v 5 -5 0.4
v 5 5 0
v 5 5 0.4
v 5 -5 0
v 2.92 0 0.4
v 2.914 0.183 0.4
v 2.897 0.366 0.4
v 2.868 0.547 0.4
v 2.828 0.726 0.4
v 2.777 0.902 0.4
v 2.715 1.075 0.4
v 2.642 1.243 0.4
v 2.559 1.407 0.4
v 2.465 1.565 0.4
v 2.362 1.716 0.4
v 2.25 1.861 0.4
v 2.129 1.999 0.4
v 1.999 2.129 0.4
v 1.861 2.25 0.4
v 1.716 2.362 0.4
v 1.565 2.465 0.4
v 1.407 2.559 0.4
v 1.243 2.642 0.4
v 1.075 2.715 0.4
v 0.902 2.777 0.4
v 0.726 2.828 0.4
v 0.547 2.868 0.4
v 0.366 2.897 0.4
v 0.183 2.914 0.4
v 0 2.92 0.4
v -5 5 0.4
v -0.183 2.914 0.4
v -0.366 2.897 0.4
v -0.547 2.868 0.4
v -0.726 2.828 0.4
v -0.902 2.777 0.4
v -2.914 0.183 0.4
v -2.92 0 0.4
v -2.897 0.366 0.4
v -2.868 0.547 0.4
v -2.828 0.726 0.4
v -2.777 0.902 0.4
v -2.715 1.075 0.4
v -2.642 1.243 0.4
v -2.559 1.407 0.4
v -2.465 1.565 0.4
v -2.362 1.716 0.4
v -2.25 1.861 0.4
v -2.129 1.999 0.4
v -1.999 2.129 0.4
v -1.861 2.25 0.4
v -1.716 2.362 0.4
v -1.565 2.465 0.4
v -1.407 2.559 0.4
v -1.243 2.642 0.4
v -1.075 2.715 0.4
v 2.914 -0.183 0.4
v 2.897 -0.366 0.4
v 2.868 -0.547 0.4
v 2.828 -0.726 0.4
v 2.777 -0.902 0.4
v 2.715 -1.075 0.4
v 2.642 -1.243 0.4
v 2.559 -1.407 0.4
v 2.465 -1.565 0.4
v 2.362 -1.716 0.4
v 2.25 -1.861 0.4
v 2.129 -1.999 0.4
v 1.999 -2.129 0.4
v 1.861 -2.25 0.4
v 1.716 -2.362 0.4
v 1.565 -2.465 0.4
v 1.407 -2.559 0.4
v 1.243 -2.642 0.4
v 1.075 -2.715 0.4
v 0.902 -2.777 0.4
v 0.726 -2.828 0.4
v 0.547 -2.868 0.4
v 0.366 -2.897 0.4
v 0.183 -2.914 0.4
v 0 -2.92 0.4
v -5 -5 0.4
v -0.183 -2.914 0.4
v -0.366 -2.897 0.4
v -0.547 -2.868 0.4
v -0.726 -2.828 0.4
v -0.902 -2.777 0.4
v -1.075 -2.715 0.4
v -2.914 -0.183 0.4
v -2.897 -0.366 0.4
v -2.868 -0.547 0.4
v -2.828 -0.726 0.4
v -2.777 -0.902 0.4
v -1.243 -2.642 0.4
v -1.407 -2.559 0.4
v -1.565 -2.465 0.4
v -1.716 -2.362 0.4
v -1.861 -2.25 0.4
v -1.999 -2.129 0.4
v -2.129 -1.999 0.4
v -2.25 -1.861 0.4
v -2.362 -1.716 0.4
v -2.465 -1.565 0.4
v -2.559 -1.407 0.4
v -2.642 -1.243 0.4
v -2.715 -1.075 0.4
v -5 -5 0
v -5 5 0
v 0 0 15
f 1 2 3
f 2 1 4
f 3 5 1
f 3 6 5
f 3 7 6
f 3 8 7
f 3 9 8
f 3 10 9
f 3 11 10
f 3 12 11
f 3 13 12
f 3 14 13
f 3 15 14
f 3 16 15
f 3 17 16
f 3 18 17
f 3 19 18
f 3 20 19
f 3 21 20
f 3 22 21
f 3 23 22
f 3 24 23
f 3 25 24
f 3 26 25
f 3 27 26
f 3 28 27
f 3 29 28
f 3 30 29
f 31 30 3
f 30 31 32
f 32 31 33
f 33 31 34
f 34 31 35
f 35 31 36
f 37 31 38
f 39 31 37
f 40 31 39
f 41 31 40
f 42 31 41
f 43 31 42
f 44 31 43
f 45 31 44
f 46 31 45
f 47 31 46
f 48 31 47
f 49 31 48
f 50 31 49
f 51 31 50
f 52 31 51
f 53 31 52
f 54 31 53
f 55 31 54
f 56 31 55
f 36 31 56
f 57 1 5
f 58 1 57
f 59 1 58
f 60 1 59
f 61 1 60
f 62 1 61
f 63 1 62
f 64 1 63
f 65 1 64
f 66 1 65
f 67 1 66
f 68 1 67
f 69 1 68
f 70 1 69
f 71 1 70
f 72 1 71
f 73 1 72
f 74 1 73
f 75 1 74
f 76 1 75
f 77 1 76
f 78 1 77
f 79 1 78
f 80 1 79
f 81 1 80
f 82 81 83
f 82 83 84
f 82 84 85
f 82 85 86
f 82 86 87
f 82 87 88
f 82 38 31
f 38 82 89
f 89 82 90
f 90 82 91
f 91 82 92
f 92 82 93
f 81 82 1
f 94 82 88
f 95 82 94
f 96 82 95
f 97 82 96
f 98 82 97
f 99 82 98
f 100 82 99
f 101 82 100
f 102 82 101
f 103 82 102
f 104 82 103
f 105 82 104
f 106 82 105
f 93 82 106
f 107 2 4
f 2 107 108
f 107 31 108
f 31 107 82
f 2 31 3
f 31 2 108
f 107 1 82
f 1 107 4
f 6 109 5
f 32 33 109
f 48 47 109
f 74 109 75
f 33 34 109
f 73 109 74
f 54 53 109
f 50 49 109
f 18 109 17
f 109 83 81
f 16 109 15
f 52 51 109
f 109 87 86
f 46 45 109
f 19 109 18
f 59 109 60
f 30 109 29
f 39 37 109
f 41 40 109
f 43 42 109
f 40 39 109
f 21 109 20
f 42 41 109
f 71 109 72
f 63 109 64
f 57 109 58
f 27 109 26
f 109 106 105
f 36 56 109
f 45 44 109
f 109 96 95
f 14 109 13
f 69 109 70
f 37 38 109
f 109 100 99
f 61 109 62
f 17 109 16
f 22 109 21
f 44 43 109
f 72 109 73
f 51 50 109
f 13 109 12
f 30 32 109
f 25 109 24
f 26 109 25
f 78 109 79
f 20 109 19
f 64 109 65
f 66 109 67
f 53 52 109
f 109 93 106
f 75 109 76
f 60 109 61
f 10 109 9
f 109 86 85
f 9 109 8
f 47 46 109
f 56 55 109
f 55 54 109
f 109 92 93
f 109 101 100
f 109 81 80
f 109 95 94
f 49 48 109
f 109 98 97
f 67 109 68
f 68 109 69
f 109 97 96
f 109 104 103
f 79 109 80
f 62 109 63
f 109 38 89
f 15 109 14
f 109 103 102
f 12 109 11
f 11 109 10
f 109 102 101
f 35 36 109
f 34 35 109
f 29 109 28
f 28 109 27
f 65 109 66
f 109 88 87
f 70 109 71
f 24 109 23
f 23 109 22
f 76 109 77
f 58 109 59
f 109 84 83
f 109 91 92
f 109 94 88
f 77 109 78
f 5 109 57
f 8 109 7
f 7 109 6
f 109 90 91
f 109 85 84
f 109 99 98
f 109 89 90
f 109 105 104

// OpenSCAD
$fn=100;

base=10;
height=15;

// Base
bs=base;
translate([-bs/2,-bs/2,0])
cube([bs,bs,0.4]);

// Cone
cylinder(r1=3, r2=0, h=height);
